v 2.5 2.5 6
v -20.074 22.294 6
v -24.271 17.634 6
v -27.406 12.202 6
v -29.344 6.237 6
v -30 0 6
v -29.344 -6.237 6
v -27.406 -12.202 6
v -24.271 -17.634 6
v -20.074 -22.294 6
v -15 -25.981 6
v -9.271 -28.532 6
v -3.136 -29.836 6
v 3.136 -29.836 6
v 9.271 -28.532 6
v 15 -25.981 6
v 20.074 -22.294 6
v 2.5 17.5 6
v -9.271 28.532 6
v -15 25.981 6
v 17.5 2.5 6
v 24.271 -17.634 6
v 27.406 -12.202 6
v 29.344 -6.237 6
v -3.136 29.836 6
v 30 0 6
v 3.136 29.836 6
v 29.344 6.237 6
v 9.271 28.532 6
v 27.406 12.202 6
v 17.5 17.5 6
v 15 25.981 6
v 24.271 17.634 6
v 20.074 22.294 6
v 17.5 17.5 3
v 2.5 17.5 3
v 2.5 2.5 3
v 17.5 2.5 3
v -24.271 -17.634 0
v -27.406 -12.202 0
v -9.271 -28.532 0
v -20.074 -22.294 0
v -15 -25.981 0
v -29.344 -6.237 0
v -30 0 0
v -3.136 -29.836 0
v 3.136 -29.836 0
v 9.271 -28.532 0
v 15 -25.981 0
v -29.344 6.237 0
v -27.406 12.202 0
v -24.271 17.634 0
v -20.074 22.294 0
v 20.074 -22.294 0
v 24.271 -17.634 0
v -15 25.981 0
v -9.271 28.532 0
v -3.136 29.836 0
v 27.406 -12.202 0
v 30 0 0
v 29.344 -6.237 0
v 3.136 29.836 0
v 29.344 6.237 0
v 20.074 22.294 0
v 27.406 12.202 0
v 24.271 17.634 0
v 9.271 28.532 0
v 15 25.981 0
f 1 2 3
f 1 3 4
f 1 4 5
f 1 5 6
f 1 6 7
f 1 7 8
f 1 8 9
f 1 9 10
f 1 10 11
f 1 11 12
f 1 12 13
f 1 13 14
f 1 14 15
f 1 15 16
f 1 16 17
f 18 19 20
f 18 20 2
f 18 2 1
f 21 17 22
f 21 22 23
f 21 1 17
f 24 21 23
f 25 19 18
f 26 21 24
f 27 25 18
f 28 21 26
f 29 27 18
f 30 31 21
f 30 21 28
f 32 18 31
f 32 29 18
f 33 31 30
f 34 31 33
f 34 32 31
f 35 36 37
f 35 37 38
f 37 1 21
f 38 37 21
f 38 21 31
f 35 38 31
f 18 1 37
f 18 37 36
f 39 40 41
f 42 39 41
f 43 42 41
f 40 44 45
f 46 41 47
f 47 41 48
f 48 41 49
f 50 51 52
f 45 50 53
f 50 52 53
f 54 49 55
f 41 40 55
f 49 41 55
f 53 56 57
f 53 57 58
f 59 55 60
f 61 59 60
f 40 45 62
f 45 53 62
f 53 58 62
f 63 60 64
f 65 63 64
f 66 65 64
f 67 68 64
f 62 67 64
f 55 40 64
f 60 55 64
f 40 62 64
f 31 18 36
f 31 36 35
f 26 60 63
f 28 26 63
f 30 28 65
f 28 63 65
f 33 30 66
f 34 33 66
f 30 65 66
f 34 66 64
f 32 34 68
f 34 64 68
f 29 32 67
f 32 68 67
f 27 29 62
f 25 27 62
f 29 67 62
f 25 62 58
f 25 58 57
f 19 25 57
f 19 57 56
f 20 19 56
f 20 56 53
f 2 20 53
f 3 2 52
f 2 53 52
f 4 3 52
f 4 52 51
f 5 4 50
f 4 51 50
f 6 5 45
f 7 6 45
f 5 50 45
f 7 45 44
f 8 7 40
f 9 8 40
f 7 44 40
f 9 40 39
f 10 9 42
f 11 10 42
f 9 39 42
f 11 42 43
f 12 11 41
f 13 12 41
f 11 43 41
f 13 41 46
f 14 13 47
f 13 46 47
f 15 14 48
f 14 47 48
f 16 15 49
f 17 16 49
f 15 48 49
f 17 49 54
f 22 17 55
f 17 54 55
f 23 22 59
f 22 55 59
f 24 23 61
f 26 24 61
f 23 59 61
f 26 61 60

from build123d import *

# Parameters (mm, degrees)
F0_R     = 30
F1_DEPTH = 6
F2_W     = 15
F2_H     = 15
F3_DEPTH = 3


with BuildPart() as f1:
    # F0 (on Top) → F1 (new body)
    with BuildSketch(Plane.XY):
        Circle(F0_R)
    extrude(amount=F1_DEPTH)

    # F2 (on face) → F3 (cut)
    with BuildSketch(Plane.XY.offset(6)):
        with Locations((10, 10)):
            Rectangle(F2_W, F2_H)
    extrude(amount=-F3_DEPTH, mode=Mode.SUBTRACT)


solid = f1.part
